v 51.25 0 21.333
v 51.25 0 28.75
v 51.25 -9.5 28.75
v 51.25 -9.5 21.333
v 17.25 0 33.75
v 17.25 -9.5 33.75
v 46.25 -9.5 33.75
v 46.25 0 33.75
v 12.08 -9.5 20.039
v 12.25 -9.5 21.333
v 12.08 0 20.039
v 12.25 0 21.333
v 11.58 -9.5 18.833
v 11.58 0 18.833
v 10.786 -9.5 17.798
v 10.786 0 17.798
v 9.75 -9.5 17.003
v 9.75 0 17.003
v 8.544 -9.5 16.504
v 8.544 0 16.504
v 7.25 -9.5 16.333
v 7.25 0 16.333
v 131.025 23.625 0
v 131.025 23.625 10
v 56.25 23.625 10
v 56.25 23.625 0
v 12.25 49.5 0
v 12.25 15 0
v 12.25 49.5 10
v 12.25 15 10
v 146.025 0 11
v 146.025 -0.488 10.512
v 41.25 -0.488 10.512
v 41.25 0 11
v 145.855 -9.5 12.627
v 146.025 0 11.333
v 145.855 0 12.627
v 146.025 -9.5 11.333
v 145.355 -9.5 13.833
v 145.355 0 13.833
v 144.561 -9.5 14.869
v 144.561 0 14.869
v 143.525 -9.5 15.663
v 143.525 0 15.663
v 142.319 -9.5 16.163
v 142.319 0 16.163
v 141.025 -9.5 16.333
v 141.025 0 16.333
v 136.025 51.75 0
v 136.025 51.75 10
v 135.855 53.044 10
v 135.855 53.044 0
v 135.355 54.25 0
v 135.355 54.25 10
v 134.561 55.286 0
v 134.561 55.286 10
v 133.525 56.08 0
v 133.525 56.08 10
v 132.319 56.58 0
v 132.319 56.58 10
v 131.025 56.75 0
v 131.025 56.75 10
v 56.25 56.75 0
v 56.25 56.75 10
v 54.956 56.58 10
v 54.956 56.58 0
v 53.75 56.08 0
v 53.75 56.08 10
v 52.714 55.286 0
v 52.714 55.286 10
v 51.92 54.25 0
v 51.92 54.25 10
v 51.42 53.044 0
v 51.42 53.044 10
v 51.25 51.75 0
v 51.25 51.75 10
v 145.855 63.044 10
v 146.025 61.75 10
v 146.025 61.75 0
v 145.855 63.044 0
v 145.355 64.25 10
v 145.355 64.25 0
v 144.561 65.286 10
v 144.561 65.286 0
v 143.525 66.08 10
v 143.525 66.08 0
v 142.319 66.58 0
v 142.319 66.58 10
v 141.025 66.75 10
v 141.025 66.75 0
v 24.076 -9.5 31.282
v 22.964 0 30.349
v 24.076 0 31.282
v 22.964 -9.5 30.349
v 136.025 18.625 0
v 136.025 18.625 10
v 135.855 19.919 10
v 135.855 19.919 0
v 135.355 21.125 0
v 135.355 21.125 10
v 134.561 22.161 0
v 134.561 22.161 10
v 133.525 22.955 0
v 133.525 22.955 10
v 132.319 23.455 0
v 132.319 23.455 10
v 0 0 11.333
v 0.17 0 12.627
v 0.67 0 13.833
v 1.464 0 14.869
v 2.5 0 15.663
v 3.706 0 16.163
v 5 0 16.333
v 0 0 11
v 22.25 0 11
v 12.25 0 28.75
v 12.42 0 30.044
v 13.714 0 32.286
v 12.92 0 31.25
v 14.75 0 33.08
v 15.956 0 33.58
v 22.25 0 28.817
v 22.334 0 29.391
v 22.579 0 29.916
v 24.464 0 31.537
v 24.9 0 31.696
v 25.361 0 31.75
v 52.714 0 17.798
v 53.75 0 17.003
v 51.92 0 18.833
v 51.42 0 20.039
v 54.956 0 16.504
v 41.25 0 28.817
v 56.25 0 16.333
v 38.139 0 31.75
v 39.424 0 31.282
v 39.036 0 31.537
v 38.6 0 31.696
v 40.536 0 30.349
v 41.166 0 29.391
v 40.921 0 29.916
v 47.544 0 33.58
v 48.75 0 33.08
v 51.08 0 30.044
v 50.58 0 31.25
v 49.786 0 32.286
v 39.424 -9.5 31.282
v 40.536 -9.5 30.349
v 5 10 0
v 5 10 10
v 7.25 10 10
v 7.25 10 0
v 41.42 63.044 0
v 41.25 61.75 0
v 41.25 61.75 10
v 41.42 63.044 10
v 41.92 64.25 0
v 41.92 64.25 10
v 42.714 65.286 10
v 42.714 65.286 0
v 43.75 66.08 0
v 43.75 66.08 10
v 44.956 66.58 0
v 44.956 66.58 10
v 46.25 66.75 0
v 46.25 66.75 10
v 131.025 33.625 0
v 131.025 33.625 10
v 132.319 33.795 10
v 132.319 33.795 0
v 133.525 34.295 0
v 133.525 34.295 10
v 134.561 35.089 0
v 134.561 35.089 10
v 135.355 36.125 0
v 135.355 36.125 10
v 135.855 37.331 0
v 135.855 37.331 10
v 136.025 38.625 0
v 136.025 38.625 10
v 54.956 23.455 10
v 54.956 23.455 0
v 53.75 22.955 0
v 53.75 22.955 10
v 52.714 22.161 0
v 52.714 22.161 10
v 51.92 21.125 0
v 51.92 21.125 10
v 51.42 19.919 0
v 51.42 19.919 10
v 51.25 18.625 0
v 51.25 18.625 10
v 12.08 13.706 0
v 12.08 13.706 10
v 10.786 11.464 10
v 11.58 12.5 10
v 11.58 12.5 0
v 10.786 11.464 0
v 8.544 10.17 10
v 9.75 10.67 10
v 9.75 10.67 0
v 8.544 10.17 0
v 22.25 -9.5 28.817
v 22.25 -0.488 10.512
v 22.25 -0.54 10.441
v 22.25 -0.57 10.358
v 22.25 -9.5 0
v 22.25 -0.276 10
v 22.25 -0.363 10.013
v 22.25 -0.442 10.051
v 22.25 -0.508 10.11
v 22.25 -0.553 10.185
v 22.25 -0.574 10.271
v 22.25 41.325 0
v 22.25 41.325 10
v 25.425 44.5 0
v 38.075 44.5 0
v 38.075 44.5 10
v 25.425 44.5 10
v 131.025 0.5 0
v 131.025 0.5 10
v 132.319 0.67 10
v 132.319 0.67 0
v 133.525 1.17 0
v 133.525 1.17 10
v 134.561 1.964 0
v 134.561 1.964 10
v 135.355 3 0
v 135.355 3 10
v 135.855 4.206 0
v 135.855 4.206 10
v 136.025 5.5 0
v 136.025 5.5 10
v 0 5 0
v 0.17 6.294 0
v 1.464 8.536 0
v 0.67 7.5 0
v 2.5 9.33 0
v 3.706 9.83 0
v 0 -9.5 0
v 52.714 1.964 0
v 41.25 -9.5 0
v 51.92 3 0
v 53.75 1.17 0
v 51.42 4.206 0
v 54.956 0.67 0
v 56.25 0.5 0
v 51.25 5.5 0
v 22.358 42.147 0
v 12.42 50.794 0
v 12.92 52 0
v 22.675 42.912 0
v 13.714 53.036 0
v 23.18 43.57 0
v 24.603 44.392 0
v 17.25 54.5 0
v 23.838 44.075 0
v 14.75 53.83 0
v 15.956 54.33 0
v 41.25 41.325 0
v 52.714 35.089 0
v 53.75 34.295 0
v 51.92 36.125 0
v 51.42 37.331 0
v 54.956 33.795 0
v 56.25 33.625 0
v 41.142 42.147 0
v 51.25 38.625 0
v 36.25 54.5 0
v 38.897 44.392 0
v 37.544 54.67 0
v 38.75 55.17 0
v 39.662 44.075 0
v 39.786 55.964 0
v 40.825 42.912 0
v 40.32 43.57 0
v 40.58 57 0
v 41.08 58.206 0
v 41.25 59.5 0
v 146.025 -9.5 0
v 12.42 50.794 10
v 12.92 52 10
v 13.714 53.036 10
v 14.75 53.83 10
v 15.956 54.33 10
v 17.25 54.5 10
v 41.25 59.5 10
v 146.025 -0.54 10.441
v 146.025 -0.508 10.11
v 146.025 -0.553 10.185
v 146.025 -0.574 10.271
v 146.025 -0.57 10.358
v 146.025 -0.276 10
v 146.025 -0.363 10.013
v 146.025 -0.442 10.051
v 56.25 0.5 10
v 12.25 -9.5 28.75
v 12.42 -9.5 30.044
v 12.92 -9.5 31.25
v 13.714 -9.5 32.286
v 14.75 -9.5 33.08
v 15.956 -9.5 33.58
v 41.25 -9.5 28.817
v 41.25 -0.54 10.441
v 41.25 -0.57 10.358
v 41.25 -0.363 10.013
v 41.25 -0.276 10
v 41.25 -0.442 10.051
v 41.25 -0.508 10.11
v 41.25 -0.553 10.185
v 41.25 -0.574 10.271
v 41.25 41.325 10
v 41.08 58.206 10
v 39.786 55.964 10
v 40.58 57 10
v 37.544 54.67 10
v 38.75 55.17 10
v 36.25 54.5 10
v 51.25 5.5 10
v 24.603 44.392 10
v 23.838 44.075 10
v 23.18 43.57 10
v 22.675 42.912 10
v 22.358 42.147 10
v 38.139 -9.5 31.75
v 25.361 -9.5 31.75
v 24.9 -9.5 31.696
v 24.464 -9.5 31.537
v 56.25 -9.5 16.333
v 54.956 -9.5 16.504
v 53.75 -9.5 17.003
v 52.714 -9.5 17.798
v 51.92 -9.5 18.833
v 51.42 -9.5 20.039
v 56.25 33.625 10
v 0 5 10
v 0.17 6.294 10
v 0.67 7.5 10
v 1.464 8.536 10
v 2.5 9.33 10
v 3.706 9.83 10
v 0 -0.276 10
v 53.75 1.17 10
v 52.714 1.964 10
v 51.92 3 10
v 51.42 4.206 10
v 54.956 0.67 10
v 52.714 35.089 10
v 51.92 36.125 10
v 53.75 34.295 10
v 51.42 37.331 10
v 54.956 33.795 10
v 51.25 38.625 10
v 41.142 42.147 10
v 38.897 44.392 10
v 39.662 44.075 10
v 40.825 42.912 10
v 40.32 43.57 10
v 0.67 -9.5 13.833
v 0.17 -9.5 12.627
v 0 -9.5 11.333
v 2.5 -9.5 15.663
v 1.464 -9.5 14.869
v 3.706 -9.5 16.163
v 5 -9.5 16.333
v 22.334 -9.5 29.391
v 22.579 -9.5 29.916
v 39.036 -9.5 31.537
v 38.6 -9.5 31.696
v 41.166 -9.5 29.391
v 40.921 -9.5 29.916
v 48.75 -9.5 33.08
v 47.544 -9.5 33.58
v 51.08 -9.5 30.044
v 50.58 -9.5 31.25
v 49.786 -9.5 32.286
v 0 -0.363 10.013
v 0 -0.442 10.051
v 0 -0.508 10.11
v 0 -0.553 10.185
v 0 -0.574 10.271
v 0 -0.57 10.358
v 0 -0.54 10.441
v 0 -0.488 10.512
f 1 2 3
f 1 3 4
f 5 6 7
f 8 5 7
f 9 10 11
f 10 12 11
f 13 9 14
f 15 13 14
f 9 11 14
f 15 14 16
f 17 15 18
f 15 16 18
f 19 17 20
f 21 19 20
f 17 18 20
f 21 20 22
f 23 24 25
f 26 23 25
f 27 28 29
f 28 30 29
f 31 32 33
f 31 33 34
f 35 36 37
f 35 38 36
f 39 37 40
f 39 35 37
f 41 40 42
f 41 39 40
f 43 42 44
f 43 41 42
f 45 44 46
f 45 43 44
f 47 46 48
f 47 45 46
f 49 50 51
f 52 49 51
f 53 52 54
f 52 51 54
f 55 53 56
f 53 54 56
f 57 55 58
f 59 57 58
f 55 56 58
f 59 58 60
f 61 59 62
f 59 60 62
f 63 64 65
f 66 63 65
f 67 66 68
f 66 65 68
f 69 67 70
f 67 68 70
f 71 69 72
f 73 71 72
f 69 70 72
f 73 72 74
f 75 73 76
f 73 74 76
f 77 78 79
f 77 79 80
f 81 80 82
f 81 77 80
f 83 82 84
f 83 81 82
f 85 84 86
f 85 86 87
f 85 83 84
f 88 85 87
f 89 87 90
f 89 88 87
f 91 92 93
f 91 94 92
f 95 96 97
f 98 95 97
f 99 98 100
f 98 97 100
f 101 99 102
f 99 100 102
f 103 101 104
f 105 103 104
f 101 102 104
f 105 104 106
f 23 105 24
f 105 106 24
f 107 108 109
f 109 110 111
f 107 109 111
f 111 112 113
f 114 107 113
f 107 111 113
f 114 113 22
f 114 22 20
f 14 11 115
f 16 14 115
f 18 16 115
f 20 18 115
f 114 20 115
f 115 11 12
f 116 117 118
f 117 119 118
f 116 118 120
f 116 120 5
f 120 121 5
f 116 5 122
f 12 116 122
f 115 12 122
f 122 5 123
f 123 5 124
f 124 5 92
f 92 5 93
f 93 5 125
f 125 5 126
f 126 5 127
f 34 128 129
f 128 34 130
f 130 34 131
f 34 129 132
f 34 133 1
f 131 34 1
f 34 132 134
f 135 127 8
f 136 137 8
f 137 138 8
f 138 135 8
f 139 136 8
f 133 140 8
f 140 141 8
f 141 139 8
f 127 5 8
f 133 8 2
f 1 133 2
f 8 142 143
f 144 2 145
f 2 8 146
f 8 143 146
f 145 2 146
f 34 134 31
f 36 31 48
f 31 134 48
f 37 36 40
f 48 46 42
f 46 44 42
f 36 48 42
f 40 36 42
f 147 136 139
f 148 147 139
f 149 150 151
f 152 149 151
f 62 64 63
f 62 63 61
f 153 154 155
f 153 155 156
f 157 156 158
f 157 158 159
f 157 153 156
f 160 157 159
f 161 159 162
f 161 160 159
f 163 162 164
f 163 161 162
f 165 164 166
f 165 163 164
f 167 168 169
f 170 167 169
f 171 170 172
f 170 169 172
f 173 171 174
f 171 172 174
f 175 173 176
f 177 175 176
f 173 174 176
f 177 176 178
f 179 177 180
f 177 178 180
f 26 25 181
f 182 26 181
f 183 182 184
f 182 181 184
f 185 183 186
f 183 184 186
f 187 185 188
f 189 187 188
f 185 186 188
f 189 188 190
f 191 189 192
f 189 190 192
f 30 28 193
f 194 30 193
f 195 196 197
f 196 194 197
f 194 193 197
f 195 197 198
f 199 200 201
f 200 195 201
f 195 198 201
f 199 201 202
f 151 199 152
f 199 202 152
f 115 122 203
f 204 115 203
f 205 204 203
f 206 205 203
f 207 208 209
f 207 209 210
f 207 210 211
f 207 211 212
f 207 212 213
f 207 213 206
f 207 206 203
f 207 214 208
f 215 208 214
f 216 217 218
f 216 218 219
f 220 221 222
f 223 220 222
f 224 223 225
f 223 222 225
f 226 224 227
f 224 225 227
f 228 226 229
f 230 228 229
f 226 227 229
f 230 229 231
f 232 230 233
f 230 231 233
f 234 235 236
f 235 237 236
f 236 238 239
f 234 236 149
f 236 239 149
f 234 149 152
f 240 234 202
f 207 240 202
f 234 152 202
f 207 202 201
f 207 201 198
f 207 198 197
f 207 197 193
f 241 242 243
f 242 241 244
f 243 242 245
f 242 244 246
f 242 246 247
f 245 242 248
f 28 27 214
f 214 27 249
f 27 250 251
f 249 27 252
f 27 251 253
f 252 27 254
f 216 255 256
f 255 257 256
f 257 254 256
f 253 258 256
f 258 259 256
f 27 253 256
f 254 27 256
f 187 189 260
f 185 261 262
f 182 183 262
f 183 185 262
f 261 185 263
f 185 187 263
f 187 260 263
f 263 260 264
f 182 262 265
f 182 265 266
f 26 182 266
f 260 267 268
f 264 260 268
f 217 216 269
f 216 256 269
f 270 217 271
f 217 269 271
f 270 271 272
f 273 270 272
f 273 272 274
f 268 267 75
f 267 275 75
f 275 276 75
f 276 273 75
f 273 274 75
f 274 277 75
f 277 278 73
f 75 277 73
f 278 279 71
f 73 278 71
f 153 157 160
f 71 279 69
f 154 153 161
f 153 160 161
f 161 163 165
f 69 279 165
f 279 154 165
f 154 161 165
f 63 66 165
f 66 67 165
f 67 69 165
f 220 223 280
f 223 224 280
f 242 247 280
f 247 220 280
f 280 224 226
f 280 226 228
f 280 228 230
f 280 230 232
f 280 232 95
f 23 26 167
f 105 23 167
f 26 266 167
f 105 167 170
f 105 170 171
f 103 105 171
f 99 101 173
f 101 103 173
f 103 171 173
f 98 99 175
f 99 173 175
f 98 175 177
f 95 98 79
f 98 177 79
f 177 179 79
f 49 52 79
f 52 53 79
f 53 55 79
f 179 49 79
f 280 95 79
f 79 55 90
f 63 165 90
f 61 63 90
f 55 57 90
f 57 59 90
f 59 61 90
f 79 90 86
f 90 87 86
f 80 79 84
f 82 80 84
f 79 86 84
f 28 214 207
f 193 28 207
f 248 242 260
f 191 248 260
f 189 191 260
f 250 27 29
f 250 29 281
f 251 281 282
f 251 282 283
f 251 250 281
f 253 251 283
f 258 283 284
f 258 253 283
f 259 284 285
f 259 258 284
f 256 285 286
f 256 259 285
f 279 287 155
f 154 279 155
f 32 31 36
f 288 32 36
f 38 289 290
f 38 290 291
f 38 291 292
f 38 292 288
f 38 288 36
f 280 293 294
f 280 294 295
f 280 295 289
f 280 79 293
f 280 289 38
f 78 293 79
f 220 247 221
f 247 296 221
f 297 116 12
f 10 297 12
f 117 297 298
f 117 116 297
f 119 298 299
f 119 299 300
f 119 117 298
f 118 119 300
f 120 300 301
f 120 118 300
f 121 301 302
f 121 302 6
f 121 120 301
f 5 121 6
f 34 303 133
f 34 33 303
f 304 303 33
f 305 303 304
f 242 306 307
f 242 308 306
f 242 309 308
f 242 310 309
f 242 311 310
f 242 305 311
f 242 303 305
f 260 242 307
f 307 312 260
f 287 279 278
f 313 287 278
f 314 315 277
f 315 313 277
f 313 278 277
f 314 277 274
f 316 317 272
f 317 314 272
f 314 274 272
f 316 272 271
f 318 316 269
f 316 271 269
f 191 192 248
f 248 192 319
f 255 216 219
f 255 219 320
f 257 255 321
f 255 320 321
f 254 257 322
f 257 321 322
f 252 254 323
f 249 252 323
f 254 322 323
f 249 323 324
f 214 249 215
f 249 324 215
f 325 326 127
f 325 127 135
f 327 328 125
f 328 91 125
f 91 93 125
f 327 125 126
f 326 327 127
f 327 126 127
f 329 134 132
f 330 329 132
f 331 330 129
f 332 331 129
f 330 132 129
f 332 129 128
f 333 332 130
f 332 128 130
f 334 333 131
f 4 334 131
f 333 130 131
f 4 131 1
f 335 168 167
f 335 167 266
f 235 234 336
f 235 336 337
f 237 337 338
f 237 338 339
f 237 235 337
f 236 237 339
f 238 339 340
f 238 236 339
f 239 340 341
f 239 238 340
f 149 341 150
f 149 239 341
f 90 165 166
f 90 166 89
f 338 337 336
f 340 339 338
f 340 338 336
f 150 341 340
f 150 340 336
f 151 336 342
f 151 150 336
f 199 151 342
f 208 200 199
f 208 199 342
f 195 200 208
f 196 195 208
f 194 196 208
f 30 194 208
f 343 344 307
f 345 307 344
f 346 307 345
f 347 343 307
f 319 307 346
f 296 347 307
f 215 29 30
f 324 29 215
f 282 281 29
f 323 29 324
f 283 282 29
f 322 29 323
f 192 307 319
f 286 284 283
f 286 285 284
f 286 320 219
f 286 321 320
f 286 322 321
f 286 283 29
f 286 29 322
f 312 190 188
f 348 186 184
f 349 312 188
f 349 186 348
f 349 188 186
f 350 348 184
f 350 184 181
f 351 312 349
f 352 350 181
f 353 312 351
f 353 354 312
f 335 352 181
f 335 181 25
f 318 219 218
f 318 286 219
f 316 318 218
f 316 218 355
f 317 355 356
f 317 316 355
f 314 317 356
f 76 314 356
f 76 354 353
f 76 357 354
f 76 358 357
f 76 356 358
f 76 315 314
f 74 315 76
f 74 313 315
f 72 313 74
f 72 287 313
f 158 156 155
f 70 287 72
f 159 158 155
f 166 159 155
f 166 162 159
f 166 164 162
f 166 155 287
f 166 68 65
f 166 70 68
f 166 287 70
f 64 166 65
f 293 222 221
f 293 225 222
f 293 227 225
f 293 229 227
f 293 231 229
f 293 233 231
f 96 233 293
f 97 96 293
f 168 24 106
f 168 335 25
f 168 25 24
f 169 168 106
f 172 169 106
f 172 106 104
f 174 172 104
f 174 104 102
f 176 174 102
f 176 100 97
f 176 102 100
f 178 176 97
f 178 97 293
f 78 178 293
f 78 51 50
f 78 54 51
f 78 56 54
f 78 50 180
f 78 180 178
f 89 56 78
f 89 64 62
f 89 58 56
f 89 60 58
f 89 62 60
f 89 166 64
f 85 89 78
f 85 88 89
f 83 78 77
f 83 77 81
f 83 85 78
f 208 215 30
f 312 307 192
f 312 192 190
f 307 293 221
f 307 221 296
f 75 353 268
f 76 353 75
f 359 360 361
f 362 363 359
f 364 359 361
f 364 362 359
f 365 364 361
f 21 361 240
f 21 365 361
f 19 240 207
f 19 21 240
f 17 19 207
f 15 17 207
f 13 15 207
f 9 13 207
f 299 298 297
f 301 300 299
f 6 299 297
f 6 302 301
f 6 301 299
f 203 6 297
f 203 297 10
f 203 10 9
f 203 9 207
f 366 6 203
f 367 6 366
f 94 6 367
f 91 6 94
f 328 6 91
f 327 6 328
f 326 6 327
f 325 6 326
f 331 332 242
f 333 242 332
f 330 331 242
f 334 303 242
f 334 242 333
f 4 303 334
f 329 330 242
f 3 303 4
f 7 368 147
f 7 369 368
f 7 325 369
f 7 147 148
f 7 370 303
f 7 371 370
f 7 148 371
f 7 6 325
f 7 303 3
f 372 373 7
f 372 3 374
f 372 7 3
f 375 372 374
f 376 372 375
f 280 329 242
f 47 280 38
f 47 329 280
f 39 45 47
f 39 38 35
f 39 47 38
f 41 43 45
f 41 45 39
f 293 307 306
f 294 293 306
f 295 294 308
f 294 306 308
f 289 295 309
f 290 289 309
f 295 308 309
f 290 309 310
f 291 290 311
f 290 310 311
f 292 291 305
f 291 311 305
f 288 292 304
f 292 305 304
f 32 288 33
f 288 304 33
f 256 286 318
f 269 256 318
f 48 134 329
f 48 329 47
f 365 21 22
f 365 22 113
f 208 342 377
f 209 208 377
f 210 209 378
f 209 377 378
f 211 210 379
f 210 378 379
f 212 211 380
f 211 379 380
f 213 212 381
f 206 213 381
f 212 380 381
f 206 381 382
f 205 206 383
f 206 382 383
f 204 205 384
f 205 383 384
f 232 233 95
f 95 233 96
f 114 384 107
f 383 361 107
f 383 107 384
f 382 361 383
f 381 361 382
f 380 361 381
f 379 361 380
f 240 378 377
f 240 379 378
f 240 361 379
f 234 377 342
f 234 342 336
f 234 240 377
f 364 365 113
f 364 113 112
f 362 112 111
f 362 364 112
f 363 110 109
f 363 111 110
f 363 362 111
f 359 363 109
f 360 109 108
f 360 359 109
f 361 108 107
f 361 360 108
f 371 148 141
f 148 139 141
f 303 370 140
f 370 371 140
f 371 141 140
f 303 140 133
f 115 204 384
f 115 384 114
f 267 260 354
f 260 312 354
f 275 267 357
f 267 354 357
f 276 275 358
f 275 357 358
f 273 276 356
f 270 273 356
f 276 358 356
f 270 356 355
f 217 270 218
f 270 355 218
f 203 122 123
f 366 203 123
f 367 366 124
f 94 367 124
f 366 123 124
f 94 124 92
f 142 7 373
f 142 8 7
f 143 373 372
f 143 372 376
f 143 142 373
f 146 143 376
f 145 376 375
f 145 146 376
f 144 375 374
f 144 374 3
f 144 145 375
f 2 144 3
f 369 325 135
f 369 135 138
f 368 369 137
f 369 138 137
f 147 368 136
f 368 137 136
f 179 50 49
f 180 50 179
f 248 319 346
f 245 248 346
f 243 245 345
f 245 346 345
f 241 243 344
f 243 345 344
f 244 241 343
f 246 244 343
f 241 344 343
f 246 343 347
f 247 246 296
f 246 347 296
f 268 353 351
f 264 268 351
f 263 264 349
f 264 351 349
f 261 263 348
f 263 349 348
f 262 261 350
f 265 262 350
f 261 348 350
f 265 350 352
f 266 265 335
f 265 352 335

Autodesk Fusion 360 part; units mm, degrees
sketch "Sketch2" plane through (0, 0, 0) normal (0, 0, 1) x (1, 0, 0) in component "jig"
  line L0 (0, 0) -> (0, 66.75)
  line L1 (0, 66.75) -> (146.025, 66.75)
  line L2 (146.025, 66.75) -> (146.025, 0)
  line L3 (146.025, 0) -> (0, 0)
  line L4 (22.25, 0) -> (41.25, 0)
  line L5 (41.25, 0) -> (41.25, 44.5)
  line L6 (41.25, 44.5) -> (22.25, 44.5)
  line L7 (22.25, 44.5) -> (22.25, 0)
  line L8 (0, 0) -> (22.25, 0)
  line L9 (22.25, 0) -> (22.25, -9.5)
  line L10 (22.25, -9.5) -> (0, -9.5)
  line L11 (0, -9.5) -> (0, 0)
  line L12 (146.025, 0) -> (41.25, 0)
  line L13 (41.25, 0) -> (41.25, -9.5)
  line L14 (41.25, -9.5) -> (146.025, -9.5)
  line L15 (146.025, -9.5) -> (146.025, 0)
  line L16 (22.25, 44.5) -> (0, 44.5) construction
  line L17 (41.25, 44.5) -> (146.025, 44.5) construction
  dimension "d27" = 104.775
  dimension "d29" = 9.5
  dimension "d58" = 19
  dimension "d59" = 22.25
  dimension "d60" = 44.5
  dimension "d64" = 22.25
extrude "Extrude1" add sketch "Sketch2" along normal blind 10 contours L0 L1 L2 L3 L5 L6 L7 L8 L12 in component "jig"
extrude "Extrude2" add sketch "Sketch2" along normal blind 33.75 contours L3 L8 L9 L10 L11 | L3 L12 L13 L14 L15 in component "jig"
sketch "Sketch3" plane through (0, 0, 0) normal (-1, 0, 0) x (0, -1, 0) in component "jig"
  line L0 (-66.75, 0) -> (9.5, 0)
  line L1 (9.5, 0) -> (9.5, 33.75)
  line L2 (9.5, 33.75) -> (0, 33.75)
  line L3 (-160, 13) -> (-160.4879, 12.5121)
  line L4 (-160.2757, 12) -> (-160, 12)
  line L5 (-160, 13) -> (-160, 12)
  arc A0 (-160.4879, 12.5121) -> (-160.2757, 12) centre (-160.2757, 12.3) ccw
  line L6 (0, 10) -> (0.2757, 10)
  line L7 (0.4879, 10.5121) -> (0, 11)
  line L8 (0, 10) -> (0, 11)
  arc A1 (0.2757, 10) -> (0.4879, 10.5121) centre (0.2757, 10.3) ccw
  line L9 (-66.75, 10) -> (-66.75, 0)
  line L10 (0, 33.75) -> (0, 10)
  line L11 (0, 10) -> (-66.75, 10)
  dimension "d34" = 1
  dimension "d35" = 0.3
  dimension "d36" = 45
  dimension "d37" = 1
  dimension "d38" = 45
  dimension "d39" = 0.3
extrude "Extrude3" cut sketch "Sketch3" against normal up to surface (146.025 mm away) contours L6 L7 L8 A1 L10 | L3 L4 L5 A0 in component "jig"
fillet "Fillet2" radius 3.175 2 edges at (22.25, 44.5, 5) (41.25, 44.5, 5) in component "jig"
sketch "Sketch2 (2)" plane through (0, -9.5, 0) normal (0, -1, 0) x (1, 0, 0) in component "jig"
  line L0 (0, 0) -> (22.25, 0)
  line L1 (22.25, 0) -> (22.25, 33.75)
  line L2 (22.25, 33.75) -> (0, 33.75)
  line L3 (0, 33.75) -> (0, 0)
  line L4 (22.25, 33.75) -> (41.25, 33.75)
  line L5 (41.25, 0) -> (41.25, 33.75)
  line L6 (41.25, 33.75) -> (41.25, 29.75)
  line L7 (22.25, 33.75) -> (22.25, 29.75)
  line L8 (22.25, 29.75) -> (24.6335, 31.75)
  line L9 (24.6335, 31.75) -> (38.8665, 31.75)
  line L10 (38.8665, 31.75) -> (41.25, 29.75)
  line L11 (22.25, 29.75) -> (41.25, 29.75) construction
  point P0 (41.25, 33.75)
  dimension "d65" = 50
  dimension "d66" = 50
  dimension "d67" = 4
  dimension "d68" = 2
extrude "Extrude5" add sketch "Sketch2 (2)" against normal up to surface (9.5 mm away) contours L1 L4 L5 L6 L7 L8 L9 L10 in component "jig"
sketch "Sketch3 (2)" plane through (0, 0, 10) normal (0, 0, 1) x (-1, 0, 0) in component "jig"
  line L0 (-25.425, -44.5) -> (-38.075, -44.5)
  arc A0 (-41.25, -41.325) -> (-38.075, -44.5) centre (-38.075, -41.325) ccw
  line L1 (-41.25, -41.325) -> (-41.25, 0.2757)
  line L2 (-41.25, 0.2757) -> (-146.025, 0.2757)
  line L3 (-146.025, 0.2757) -> (-146.025, -66.75)
  line L4 (-146.025, -66.75) -> (0, -66.75)
  line L5 (0, -66.75) -> (0, 0.2757)
  line L6 (0, 0.2757) -> (-22.25, 0.2757)
  line L7 (-22.25, 0.2757) -> (-22.25, -41.325)
  arc A1 (-25.425, -44.5) -> (-22.25, -41.325) centre (-25.425, -41.325) ccw
  line L8 (-56.25, -56.75) -> (-131.025, -56.75)
  line L9 (-136.025, -51.75) -> (-136.025, -38.625)
  line L10 (-131.025, -33.625) -> (-56.25, -33.625)
  line L11 (-51.25, -38.625) -> (-51.25, -51.75)
  line L12 (-146.025, 0) -> (0, 0)
  arc A2 (-56.25, -56.75) -> (-51.25, -51.75) centre (-56.25, -51.75) ccw
  arc A3 (-136.025, -51.75) -> (-131.025, -56.75) centre (-131.025, -51.75) ccw
  arc A4 (-131.025, -33.625) -> (-136.025, -38.625) centre (-131.025, -38.625) ccw
  arc A5 (-51.25, -38.625) -> (-56.25, -33.625) centre (-56.25, -38.625) ccw
  line L13 (-56.25, -0.5) -> (-131.025, -0.5)
  line L14 (-136.025, -5.5) -> (-136.025, -18.625)
  line L15 (-131.025, -23.625) -> (-56.25, -23.625)
  line L16 (-51.25, -18.625) -> (-51.25, -5.5)
  line L17 (0, 9.5) -> (-146.025, 9.5)
  line L18 (-93.6375, -56.75) -> (-93.6375, -33.625) construction
  line L19 (-93.6375, -23.625) -> (-93.6375, -0.5) construction
  arc A6 (-56.25, -23.625) -> (-51.25, -18.625) centre (-56.25, -18.625) ccw
  arc A7 (-51.25, -5.5) -> (-56.25, -0.5) centre (-56.25, -5.5) ccw
  arc A8 (-131.025, -0.5) -> (-136.025, -5.5) centre (-131.025, -5.5) ccw
  arc A9 (-136.025, -18.625) -> (-131.025, -23.625) centre (-131.025, -18.625) ccw
  dimension "d71" = 10
  dimension "d72" = 10
  dimension "d74" = 10
  dimension "d75" = 5
  dimension "d89" = 10
  dimension "d90" = 10
  dimension "d91" = 5
extrude "Extrude6" cut sketch "Sketch3 (2)" against normal up to surface (10 mm away) contours L8 L9 L10 L11 A2 A3 A4 A5 | L13 L14 L15 L16 A6 A7 A8 A9 in component "jig"
sketch "Sketch10" plane through (0, 0, 0) normal (0, 1, 0) x (-1, 0, 0) in component "jig"
  line L0 (-146.025, 11) -> (-41.25, 11)
  line L1 (-41.25, 11) -> (-41.25, 29.75)
  line L2 (-41.25, 29.75) -> (-38.8665, 31.75)
  line L3 (-38.8665, 31.75) -> (-24.6335, 31.75)
  line L4 (-24.6335, 31.75) -> (-22.25, 29.75)
  line L5 (-22.25, 29.75) -> (-22.25, 11)
  line L6 (-22.25, 11) -> (0, 11)
  line L7 (0, 11) -> (0, 33.75)
  line L8 (0, 33.75) -> (-146.025, 33.75)
  line L9 (-146.025, 33.75) -> (-146.025, 11)
  line L10 (-146.025, 49.75) -> (-53.25, 49.75)
  line L11 (-51.25, 28.75) -> (-51.25, 21.3333)
  line L12 (-56.25, 16.3333) -> (-146.025, 16.3333)
  line L13 (-146.025, 16.3333) -> (-146.025, 49.75)
  line L14 (-146.025, 10) -> (0, 10)
  line L15 (0, 49.75) -> (-10.25, 49.75)
  line L16 (-12.25, 28.75) -> (-12.25, 21.3333)
  line L17 (-7.25, 16.3333) -> (0, 16.3333)
  line L18 (0, 16.3333) -> (0, 49.75)
  line L19 (-53.25, 49.75) -> (-10.25, 49.75)
  line L20 (-17.25, 33.75) -> (-46.25, 33.75)
  arc A0 (-56.25, 16.3333) -> (-51.25, 21.3333) centre (-56.25, 21.3333) ccw
  arc A1 (-46.25, 33.75) -> (-51.25, 28.75) centre (-46.25, 28.75) ccw
  arc A2 (-12.25, 28.75) -> (-17.25, 33.75) centre (-17.25, 28.75) ccw
  arc A3 (-12.25, 21.3333) -> (-7.25, 16.3333) centre (-7.25, 21.3333) ccw
  dimension "d81" = 10
  dimension "d82" = 6.3333
  dimension "d83" = 6.3333
  dimension "d84" = 10
  dimension "d85" = 16
  dimension "d86" = 5
extrude "Extrude7" cut sketch "Sketch10" against normal up to surface (9.5 mm away) contours L8 L9 L11 L12 L13 A0 A1 | L7 L8 L16 L17 L18 A2 A3 in component "jig"
fillet "Fillet3" radius 5 4 edges at (0, -4.75, 16.3333) (0, 66.75, 5) (146.025, -4.75, 16.3333) (146.025, 66.75, 5) in component "jig"
sketch "Sketch11" plane through (0, 0, 10) normal (0, 0, 1) x (-1, 0, 0) in component "jig"
  arc A0 (-146.025, -61.75) -> (-141.025, -66.75) centre (-141.025, -61.75) ccw
  line L0 (-141.025, -66.75) -> (-5, -66.75)
  arc A1 (-5, -66.75) -> (0, -61.75) centre (-5, -61.75) ccw
  line L1 (0, -61.75) -> (0, 0.2757)
  line L2 (0, 0.2757) -> (-22.25, 0.2757)
  line L3 (-22.25, 0.2757) -> (-22.25, -41.325)
  arc A2 (-25.425, -44.5) -> (-22.25, -41.325) centre (-25.425, -41.325) ccw
  line L4 (-25.425, -44.5) -> (-38.075, -44.5)
  arc A3 (-41.25, -41.325) -> (-38.075, -44.5) centre (-38.075, -41.325) ccw
  line L5 (-41.25, -41.325) -> (-41.25, 0.2757)
  line L6 (-41.25, 0.2757) -> (-146.025, 0.2757)
  line L7 (-146.025, 0.2757) -> (-146.025, -61.75)
  line L8 (-136.025, -51.75) -> (-136.025, -38.625)
  arc A4 (-131.025, -33.625) -> (-136.025, -38.625) centre (-131.025, -38.625) ccw
  line L9 (-131.025, -33.625) -> (-56.25, -33.625)
  arc A5 (-51.25, -38.625) -> (-56.25, -33.625) centre (-56.25, -38.625) ccw
  line L10 (-51.25, -38.625) -> (-51.25, -51.75)
  arc A6 (-56.25, -56.75) -> (-51.25, -51.75) centre (-56.25, -51.75) ccw
  line L11 (-56.25, -56.75) -> (-131.025, -56.75)
  arc A7 (-136.025, -51.75) -> (-131.025, -56.75) centre (-131.025, -51.75) ccw
  line L12 (-131.025, -0.5) -> (-56.25, -0.5)
  arc A8 (-51.25, -5.5) -> (-56.25, -0.5) centre (-56.25, -5.5) ccw
  line L13 (-51.25, -5.5) -> (-51.25, -18.625)
  arc A9 (-56.25, -23.625) -> (-51.25, -18.625) centre (-56.25, -18.625) ccw
  line L14 (-56.25, -23.625) -> (-131.025, -23.625)
  arc A10 (-136.025, -18.625) -> (-131.025, -23.625) centre (-131.025, -18.625) ccw
  line L15 (-136.025, -18.625) -> (-136.025, -5.5)
  arc A11 (-131.025, -0.5) -> (-136.025, -5.5) centre (-131.025, -5.5) ccw
  line L16 (0, -10) -> (-12.25, -10)
  line L17 (-12.25, -10) -> (-12.25, -54.5)
  line L18 (-12.25, -54.5) -> (-41.25, -54.5)
  line L19 (-41.25, -54.5) -> (-41.25, -66.75)
  line L20 (0, -10) -> (0, -66.75)
  line L21 (0, -66.75) -> (-41.25, -66.75)
  line L22 (-46.25, 0) -> (-17.25, 0)
  dimension "d94" = 10
  dimension "d95" = 10
  dimension "d96" = 10
extrude "Extrude8" cut sketch "Sketch11" against normal up to surface (10 mm away) contours L0 A1 L1 L16 L17 L18 L19 L20 L21 in component "jig"
fillet "Fillet4" radius 5 5 edges at (41.25, 66.75, 5) (41.25, 54.5, 5) (12.25, 54.5, 5) (12.25, 10, 5) (0, 10, 5) in component "jig"
fillet "Fillet5" radius 2 4 edges at (22.25, -4.75, 29.75) (24.6335, -4.75, 31.75) (38.8665, -4.75, 31.75) (41.25, -4.75, 29.75) in component "jig"
component "jig" placed x (1, 0, 0) y (0, 1, 0) z (0, 0, 1) at (0, 0, 0)
equation "stockW = 200 mm"
equation "stockH = 89 mm"
equation "stockT = 19 mm"
equation "lipT = stockT / 2"
equation "lipH = lipT * 2 / 3"
equation "jigT = 10 mm"
equation "stock2H = 160 mm"
equation "baseMargin = 3.125 in + 1\""
equation "d27 = baseMargin"
equation "d29 = lipT"
equation "d30 = jigT"
equation "d32 = jigT + stockT * 1.25"
equation "d58 = stockT"
equation "d59 = d60 / 2"
equation "d60 = stockH / 2"
equation "jigR = 0.125 in"
equation "d63 = jigR"
equation "d64 = d59"
equation "d66 = d65"
equation "d71 = cutoutOffset"
equation "d72 = d71"
equation "d74 = d71"
equation "d75 = cutoutRadius"
equation "cutoutOffset = 10 mm"
equation "cutoutRadius = 5 mm"
equation "d81 = cutoutOffset"
equation "d82 = lipH"
equation "d83 = lipH"
equation "d84 = cutoutOffset"
equation "d86 = cutoutRadius"
equation "d89 = cutoutOffset"
equation "d90 = cutoutOffset"
equation "d91 = d75"
equation "d93 = cutoutRadius"
equation "d94 = cutoutOffset"
equation "d95 = cutoutOffset"
equation "d96 = cutoutOffset"
equation "d100 = cutoutRadius"
